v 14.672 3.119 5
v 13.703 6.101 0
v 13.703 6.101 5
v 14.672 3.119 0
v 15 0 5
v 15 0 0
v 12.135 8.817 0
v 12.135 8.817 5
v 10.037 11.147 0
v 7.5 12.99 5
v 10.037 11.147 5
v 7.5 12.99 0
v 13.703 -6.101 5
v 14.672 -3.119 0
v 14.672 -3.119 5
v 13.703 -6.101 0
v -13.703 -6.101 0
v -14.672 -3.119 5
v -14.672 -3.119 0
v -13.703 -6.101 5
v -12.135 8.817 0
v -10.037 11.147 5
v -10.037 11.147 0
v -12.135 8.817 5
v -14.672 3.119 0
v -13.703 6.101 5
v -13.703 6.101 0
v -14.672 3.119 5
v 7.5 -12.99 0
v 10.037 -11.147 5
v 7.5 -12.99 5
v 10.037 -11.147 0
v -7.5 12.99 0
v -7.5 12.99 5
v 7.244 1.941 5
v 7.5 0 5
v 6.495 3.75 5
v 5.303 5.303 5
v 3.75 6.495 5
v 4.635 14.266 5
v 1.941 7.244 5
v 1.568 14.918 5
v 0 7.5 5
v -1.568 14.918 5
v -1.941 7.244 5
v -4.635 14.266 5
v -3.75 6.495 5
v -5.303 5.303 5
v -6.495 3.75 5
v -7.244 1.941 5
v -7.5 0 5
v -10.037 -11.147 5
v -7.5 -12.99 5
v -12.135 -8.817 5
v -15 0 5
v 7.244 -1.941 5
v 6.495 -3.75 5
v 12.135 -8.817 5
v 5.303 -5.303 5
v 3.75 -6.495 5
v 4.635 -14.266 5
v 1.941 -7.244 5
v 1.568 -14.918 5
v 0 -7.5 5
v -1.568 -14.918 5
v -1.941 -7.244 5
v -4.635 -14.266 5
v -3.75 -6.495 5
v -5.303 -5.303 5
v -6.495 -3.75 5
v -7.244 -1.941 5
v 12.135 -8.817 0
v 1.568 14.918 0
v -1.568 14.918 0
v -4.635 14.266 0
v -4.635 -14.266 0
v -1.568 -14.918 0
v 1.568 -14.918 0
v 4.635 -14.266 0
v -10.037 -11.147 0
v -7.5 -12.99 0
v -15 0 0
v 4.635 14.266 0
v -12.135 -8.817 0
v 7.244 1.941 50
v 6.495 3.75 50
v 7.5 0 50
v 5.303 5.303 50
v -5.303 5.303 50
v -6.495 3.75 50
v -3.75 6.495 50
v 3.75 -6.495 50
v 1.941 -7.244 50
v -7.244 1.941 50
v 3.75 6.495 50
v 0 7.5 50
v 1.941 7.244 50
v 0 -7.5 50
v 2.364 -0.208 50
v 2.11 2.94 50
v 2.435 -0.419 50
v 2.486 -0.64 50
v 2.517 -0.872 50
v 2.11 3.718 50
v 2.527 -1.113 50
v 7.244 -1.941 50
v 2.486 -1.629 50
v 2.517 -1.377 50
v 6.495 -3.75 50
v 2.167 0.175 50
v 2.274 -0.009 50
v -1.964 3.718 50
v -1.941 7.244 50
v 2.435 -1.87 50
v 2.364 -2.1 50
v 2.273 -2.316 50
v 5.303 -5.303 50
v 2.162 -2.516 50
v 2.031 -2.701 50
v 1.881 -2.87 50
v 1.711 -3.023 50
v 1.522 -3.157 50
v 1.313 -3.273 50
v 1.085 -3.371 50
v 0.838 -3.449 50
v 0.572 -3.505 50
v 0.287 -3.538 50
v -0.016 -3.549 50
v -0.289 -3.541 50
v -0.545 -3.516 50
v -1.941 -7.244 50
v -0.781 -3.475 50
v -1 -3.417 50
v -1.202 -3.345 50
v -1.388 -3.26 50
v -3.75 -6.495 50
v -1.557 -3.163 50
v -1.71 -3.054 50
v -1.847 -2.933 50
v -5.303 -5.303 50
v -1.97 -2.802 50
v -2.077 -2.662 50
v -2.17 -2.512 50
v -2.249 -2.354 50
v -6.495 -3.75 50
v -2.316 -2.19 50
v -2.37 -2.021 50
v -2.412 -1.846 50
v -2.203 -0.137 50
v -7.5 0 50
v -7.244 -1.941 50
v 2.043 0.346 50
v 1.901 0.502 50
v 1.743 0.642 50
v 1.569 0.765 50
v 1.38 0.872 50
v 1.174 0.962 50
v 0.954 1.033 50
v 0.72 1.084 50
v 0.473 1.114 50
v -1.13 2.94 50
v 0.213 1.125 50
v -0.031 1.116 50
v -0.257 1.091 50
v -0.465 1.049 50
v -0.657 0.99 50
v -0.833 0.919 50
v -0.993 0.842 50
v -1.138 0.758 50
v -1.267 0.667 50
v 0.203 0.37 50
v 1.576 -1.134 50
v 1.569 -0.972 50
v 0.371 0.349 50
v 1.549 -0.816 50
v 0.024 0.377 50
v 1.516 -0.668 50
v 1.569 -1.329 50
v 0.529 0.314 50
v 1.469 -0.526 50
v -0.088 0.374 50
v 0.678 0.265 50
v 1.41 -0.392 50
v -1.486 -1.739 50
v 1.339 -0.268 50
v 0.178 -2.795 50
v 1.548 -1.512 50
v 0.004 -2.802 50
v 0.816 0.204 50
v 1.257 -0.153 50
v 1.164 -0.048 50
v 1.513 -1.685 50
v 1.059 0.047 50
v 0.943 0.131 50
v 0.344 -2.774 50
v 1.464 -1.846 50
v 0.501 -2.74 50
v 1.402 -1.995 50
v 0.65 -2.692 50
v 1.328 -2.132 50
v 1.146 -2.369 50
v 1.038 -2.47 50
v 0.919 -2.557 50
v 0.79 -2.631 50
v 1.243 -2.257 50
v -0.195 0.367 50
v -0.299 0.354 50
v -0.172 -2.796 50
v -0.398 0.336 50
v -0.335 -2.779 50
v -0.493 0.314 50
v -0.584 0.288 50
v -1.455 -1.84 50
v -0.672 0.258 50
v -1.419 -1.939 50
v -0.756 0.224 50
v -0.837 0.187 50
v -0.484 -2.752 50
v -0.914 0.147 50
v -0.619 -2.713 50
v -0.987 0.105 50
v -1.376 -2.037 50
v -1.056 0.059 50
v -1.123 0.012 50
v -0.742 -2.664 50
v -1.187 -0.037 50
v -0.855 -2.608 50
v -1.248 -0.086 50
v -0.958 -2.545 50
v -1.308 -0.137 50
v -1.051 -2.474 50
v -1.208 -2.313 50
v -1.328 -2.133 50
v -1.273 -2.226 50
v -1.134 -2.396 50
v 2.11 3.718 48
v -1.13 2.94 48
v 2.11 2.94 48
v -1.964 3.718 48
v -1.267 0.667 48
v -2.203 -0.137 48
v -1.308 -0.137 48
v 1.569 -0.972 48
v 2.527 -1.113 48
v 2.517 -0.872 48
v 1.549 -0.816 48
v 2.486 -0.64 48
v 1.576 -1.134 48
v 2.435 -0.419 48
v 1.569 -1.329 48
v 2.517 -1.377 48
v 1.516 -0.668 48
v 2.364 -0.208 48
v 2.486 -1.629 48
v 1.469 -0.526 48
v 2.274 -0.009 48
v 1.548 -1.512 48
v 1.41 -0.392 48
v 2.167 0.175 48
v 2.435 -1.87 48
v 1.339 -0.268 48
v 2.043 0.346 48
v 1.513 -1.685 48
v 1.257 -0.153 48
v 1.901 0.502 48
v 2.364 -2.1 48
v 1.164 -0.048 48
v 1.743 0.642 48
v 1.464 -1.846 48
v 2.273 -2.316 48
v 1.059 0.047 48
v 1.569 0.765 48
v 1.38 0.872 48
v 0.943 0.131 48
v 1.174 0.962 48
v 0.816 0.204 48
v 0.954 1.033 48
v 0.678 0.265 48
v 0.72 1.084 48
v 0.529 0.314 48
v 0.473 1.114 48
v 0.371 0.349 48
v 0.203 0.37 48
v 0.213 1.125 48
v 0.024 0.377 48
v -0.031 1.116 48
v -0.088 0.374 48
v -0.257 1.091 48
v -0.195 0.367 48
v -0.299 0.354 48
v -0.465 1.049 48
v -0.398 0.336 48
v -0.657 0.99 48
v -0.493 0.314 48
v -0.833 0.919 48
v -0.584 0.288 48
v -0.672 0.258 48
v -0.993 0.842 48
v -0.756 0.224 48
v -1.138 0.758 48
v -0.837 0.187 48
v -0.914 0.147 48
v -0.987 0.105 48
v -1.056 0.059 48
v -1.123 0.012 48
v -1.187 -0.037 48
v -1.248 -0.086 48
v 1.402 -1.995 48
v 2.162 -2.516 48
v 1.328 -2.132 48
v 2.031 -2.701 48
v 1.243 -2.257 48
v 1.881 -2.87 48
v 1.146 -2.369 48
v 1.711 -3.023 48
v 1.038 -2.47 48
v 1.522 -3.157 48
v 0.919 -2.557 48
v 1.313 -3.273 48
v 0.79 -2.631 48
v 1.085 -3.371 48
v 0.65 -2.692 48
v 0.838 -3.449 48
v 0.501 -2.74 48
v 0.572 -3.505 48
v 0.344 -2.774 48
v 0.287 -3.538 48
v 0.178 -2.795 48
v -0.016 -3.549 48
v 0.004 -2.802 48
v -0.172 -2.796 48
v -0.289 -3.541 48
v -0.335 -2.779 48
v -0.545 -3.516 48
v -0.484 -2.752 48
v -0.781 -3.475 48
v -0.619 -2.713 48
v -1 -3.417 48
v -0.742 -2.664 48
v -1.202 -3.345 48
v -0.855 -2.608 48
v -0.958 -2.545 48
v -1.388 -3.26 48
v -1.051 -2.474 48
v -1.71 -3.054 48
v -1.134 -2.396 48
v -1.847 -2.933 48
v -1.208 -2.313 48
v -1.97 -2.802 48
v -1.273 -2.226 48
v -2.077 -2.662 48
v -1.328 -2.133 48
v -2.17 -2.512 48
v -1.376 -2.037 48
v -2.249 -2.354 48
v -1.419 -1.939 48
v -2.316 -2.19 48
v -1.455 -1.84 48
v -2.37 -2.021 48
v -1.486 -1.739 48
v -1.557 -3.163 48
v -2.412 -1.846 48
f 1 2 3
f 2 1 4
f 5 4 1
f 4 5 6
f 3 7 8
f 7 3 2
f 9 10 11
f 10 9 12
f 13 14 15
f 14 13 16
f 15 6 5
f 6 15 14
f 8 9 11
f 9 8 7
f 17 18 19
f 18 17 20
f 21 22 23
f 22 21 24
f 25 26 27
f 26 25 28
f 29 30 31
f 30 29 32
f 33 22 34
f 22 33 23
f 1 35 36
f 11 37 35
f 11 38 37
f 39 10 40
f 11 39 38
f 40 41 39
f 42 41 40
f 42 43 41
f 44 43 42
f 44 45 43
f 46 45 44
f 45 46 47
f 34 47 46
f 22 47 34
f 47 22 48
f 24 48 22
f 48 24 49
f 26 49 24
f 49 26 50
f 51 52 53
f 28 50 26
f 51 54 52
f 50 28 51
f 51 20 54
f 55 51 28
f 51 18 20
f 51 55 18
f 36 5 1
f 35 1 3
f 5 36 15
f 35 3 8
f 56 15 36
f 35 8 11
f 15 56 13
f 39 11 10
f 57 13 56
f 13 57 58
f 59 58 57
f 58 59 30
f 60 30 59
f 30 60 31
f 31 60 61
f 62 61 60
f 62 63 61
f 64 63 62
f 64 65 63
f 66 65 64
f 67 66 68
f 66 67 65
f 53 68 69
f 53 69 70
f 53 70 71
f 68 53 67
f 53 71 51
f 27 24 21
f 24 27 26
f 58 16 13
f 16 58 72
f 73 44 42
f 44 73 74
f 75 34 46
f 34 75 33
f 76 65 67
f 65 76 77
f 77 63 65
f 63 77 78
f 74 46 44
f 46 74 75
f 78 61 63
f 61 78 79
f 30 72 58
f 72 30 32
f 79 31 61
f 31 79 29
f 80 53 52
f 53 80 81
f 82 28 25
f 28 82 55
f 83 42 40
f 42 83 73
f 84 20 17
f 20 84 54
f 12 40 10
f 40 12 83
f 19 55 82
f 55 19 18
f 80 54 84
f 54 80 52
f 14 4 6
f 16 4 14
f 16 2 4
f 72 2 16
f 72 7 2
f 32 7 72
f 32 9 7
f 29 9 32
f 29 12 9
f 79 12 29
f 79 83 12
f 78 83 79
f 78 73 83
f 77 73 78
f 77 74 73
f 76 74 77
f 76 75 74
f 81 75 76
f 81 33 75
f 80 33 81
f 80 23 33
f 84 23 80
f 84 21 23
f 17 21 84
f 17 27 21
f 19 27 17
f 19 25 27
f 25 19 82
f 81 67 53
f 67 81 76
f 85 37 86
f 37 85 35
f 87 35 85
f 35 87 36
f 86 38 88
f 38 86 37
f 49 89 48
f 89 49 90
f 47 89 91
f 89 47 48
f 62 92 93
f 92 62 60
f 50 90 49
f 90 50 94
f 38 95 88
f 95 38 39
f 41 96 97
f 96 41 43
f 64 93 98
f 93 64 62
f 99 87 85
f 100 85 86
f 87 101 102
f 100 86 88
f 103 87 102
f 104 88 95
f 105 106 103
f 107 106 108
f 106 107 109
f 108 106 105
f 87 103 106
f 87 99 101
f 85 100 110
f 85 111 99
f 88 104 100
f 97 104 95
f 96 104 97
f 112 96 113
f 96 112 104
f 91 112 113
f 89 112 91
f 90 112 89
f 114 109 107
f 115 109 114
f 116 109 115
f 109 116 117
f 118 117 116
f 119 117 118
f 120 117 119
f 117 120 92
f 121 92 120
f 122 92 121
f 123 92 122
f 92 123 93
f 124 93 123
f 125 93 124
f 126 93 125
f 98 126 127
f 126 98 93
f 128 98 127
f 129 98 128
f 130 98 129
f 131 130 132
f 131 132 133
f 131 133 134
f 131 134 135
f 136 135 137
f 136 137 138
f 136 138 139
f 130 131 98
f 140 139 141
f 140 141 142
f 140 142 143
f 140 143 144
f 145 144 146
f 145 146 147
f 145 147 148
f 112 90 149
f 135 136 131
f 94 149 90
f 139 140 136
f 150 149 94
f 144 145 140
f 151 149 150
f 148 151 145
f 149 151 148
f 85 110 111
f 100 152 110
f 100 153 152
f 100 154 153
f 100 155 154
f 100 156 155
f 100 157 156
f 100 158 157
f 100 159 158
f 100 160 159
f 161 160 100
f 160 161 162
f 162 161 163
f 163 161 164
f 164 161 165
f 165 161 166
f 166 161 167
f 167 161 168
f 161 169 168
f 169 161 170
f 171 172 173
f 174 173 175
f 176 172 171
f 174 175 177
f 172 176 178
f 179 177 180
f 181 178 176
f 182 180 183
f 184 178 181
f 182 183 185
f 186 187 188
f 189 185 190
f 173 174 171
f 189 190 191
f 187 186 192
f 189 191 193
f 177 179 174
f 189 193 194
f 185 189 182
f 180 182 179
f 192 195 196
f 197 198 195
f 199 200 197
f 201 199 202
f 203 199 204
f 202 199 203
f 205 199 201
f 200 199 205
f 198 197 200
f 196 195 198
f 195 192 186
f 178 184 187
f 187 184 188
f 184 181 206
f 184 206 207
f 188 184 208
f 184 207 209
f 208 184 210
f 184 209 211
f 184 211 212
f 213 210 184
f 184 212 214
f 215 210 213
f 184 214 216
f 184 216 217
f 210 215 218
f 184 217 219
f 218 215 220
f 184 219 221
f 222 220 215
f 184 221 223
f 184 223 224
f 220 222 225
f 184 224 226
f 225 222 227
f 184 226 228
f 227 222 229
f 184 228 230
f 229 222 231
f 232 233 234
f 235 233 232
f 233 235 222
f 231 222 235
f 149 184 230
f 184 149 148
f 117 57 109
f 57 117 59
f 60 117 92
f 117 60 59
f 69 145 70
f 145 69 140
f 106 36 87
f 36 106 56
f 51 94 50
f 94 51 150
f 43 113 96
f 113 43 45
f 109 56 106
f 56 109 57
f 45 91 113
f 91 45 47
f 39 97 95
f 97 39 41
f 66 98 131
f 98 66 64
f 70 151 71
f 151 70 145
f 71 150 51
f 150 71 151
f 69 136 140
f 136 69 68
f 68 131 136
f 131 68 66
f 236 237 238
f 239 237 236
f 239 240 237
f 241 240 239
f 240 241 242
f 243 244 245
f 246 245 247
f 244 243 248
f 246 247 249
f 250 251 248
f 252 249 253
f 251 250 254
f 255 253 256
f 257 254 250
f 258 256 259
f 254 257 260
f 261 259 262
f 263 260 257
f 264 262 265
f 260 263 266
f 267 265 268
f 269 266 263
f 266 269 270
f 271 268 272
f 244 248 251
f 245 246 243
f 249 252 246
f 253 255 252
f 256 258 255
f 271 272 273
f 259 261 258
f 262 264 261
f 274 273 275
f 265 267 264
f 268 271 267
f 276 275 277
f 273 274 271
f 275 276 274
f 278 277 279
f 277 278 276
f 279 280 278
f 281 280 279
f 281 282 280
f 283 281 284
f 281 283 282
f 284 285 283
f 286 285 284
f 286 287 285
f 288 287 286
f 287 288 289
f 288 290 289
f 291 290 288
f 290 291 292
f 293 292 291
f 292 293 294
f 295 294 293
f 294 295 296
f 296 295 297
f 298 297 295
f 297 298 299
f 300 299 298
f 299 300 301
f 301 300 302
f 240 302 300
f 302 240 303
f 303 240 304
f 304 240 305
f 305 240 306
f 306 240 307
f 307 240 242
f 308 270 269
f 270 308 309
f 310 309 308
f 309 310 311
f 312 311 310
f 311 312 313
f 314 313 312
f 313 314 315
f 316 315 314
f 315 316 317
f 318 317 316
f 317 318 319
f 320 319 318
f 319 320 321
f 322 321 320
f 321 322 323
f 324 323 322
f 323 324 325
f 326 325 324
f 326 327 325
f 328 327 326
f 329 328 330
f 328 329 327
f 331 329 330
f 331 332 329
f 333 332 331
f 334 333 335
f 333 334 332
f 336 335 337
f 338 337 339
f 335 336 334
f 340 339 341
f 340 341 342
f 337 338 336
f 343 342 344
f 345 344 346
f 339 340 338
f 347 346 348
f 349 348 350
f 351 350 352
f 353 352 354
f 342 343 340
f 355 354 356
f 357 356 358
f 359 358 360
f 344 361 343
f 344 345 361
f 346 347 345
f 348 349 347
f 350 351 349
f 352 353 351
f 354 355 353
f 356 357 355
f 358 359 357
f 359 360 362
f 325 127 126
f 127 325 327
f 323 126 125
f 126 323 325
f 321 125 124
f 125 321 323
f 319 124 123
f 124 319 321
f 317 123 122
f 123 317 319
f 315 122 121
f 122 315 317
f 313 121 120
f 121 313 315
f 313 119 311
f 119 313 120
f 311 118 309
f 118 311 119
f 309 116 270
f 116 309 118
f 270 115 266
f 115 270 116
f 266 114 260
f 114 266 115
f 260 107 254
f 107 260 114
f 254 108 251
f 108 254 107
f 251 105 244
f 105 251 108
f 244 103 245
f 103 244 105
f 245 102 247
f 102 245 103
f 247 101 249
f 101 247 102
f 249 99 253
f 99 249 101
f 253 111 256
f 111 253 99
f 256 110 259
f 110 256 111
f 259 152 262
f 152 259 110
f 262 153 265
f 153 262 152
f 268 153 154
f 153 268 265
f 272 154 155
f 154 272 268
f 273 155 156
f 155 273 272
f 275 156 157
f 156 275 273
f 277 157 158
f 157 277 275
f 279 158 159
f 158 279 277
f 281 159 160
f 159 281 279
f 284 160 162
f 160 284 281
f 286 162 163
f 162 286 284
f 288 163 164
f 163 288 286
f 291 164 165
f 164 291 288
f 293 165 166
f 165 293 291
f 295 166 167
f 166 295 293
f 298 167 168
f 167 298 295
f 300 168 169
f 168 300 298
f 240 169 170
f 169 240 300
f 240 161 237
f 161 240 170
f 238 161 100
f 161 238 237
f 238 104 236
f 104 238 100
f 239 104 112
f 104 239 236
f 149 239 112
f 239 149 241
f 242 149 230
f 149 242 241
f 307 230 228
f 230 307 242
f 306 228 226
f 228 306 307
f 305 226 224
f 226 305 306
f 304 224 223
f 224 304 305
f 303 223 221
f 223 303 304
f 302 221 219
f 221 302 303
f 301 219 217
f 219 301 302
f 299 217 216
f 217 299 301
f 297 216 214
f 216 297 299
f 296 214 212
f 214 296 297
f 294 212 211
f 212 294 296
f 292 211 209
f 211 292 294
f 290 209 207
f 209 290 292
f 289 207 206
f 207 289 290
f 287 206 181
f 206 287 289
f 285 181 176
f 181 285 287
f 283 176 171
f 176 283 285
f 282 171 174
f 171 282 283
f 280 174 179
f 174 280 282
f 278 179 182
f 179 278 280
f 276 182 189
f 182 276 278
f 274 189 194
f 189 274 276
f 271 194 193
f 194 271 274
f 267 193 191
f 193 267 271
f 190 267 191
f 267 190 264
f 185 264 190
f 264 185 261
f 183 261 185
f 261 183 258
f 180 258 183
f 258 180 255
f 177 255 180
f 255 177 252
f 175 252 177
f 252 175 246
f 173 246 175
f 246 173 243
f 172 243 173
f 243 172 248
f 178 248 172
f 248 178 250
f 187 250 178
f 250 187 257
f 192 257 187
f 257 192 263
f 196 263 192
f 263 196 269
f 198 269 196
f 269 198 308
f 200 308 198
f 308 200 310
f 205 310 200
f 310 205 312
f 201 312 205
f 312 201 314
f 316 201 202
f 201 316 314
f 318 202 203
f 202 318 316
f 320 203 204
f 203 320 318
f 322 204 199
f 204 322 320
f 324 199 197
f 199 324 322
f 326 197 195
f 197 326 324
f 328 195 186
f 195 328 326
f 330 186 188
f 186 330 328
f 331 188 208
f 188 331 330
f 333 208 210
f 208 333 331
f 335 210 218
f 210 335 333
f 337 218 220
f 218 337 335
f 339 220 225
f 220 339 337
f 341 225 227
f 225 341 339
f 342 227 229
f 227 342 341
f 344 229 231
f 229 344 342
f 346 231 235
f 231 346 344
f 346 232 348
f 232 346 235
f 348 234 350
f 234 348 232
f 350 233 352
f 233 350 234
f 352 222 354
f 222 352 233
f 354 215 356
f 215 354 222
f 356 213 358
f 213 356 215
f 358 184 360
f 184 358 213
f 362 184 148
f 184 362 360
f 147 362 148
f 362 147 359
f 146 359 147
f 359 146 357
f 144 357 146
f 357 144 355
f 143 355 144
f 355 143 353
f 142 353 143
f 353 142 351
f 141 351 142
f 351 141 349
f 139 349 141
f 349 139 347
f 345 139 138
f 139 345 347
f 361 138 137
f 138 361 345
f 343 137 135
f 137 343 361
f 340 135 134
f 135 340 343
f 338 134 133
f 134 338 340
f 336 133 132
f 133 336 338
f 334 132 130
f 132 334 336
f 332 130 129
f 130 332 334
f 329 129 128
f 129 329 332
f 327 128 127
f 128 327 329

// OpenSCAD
// Pedestal dimensions in mm.
d_pedestal = 15;
h_pedestal = 50;

// Foot dimensions in mm.
d_foot = 2 * d_pedestal;
h_foot = 5;

// Label dimensions in mm.
h_label = 2;

function mm_to_cm(v) = v / 10;

module label() {
    linear_extrude(h_label) {
        text(
            str(mm_to_cm(h_pedestal)), 
            size=(d_pedestal / 2), 
            halign="center", 
            valign="center"
        );
    }
}

module pedestal() {
    cylinder(h_foot, d=d_foot);
    cylinder(h_pedestal, d=d_pedestal);
}

difference() {
    pedestal();
    translate([0, 0, h_pedestal - h_label]) label();
};
